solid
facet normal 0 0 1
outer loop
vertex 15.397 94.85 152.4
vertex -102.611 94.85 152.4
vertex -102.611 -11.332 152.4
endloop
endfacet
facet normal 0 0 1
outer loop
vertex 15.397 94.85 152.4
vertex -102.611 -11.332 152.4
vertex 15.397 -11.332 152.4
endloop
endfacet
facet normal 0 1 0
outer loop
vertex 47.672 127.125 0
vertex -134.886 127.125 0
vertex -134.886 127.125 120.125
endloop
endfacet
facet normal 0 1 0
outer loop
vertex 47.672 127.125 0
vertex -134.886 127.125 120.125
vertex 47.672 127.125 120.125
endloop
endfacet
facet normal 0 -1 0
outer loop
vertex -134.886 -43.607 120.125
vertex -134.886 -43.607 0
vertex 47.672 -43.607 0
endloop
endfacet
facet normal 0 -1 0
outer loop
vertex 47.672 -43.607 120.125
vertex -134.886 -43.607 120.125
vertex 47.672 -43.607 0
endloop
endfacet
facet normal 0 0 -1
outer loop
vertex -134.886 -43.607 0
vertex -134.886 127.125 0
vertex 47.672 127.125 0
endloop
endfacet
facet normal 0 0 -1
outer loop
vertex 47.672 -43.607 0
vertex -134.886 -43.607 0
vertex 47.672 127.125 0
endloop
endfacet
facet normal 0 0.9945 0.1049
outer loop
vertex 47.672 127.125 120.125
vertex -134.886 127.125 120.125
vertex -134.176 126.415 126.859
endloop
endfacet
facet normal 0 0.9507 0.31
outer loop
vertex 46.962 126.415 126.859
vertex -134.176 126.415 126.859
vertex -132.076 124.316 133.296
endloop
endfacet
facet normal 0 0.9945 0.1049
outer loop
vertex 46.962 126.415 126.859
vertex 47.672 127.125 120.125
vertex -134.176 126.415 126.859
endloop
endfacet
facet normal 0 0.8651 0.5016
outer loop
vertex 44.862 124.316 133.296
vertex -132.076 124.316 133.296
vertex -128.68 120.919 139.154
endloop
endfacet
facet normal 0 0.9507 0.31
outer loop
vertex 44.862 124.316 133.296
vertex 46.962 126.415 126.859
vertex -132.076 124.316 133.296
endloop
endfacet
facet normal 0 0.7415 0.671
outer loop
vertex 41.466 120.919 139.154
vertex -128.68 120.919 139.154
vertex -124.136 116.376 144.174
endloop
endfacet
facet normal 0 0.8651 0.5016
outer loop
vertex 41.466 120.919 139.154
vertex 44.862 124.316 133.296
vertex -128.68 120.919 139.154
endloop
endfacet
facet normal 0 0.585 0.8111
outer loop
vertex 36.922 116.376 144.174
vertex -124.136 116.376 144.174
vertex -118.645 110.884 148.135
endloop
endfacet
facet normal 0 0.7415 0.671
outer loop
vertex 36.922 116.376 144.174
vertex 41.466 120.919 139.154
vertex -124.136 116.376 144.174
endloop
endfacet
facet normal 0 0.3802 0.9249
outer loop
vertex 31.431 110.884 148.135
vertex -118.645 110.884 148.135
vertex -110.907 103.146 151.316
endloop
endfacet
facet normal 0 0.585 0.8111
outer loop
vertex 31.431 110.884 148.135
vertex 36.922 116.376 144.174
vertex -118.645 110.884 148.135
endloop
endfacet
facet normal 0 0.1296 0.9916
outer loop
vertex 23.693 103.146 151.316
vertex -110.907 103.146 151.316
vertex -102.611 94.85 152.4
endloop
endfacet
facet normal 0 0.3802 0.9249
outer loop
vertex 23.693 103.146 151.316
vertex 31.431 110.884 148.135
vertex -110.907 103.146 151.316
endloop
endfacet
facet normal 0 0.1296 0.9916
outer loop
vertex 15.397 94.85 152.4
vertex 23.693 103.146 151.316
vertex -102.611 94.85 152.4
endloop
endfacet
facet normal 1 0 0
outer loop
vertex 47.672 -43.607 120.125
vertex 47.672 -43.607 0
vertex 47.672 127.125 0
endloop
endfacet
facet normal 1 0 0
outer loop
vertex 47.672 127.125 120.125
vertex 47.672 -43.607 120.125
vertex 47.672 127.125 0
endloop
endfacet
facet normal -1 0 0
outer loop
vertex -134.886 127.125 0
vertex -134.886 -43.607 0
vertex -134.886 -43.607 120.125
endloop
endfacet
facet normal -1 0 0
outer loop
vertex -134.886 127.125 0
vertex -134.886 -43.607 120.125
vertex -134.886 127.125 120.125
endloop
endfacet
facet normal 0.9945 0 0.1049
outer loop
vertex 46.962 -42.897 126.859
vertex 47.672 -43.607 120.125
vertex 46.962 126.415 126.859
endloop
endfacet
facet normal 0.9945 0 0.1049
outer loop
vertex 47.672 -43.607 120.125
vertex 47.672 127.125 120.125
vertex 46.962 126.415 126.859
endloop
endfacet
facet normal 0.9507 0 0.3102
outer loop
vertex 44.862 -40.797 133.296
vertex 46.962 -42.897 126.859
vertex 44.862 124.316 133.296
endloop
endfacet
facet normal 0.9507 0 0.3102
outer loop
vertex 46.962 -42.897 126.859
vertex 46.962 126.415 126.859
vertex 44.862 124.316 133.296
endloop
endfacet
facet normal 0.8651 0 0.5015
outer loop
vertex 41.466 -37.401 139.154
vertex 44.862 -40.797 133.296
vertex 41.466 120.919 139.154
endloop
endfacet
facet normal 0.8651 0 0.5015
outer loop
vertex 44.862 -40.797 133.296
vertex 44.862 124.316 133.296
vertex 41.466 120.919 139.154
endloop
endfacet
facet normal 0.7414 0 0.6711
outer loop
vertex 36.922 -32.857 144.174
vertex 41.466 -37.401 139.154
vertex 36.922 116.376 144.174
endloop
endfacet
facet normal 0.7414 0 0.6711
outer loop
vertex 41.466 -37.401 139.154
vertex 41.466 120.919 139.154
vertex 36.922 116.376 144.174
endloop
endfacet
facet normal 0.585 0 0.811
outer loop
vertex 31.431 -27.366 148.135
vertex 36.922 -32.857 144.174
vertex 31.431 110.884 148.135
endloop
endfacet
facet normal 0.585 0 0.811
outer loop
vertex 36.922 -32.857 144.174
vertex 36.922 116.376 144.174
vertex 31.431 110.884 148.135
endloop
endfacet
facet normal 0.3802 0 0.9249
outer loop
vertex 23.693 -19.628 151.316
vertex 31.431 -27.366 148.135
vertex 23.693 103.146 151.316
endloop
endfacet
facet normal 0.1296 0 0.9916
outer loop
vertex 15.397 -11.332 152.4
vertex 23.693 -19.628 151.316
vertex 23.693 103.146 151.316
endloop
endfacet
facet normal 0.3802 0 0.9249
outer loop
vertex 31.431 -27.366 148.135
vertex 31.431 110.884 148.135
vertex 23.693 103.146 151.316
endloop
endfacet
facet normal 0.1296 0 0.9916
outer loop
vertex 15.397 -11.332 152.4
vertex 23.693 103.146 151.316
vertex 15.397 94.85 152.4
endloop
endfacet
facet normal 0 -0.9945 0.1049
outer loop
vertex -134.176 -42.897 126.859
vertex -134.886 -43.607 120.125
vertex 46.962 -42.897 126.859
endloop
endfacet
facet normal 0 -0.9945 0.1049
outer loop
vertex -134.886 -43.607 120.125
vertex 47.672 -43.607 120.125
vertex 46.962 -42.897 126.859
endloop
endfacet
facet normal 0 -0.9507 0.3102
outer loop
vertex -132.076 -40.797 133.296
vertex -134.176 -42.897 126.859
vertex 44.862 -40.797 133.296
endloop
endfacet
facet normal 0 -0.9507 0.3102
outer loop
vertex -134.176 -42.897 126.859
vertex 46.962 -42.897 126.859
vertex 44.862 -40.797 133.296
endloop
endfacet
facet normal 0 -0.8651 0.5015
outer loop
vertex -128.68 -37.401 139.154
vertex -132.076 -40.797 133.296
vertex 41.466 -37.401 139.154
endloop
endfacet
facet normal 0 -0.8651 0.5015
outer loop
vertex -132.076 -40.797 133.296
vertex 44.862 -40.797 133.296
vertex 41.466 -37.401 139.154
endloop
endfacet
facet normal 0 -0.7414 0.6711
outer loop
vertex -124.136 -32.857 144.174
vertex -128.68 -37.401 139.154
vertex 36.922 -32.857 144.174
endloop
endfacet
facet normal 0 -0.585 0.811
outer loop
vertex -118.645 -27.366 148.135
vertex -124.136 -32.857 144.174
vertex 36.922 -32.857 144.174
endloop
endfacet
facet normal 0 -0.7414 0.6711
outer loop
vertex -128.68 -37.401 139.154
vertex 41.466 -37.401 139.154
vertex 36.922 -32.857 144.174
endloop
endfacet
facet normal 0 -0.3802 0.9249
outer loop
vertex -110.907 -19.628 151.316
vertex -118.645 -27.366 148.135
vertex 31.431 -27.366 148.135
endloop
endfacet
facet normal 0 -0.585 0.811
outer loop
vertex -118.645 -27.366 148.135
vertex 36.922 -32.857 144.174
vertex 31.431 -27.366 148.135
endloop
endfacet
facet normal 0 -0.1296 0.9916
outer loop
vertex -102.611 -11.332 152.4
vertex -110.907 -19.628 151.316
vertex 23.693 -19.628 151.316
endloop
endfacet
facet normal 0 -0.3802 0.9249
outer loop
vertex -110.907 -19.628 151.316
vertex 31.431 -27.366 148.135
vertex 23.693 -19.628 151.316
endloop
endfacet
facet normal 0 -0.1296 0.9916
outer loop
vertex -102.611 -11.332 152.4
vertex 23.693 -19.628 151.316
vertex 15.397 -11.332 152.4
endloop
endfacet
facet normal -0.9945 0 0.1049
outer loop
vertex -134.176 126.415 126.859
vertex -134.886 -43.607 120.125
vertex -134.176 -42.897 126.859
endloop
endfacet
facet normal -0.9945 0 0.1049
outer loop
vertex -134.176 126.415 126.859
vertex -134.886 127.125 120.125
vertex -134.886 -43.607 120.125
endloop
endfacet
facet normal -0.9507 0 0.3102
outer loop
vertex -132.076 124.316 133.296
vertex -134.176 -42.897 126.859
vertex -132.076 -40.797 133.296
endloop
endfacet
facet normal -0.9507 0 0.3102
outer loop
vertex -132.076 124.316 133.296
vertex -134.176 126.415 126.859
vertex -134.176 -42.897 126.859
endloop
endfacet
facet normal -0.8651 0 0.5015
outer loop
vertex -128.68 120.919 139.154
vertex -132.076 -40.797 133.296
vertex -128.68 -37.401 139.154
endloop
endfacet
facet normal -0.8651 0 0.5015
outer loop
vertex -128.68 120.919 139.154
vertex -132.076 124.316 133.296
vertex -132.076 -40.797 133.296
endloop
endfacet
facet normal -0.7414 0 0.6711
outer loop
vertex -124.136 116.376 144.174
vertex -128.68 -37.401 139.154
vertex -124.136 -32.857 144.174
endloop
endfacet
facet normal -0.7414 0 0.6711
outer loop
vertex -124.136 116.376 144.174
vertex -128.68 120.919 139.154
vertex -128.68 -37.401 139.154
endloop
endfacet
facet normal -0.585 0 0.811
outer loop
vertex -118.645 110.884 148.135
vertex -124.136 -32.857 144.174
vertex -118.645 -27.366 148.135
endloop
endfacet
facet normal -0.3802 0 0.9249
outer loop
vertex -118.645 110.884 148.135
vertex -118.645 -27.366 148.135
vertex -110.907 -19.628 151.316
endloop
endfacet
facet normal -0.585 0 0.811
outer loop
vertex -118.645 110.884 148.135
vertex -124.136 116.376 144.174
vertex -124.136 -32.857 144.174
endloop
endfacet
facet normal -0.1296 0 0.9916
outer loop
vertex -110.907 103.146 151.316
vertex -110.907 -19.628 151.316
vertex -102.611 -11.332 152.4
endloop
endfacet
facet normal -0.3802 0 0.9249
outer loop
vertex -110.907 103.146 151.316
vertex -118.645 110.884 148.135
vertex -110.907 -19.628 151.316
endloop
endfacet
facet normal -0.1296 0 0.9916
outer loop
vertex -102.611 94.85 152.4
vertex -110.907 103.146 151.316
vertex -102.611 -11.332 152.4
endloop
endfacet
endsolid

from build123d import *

# Parameters (mm, degrees)
F0_W     = 182.557866
F0_H     = 170.73226
F2_DEPTH = 152.4
F3_R     = 32.274979
F4_DEPTH = 187.378392


with BuildPart() as f2:
    # F0 (on Top) → F2 (new body)
    with BuildSketch(Plane.XY):
        with Locations((-43.606944, 41.759193)):
            Rectangle(F0_W, F0_H)
    extrude(amount=F2_DEPTH)

    # F3
    f3_edges = [f2.edges().sort_by_distance(p)[0] for p in [
        (-43.606944, 127.125323, 152.4),
        (47.671989, 41.759193, 152.4),
        (-43.606944, -43.606937, 152.4),
        (-134.885877, 41.759193, 152.4),
    ]]
    fillet(f3_edges, radius=F3_R)

    # F1 (on face) → F4 (cut)
    with BuildSketch(Plane.XY):
        Polygon((-134.885877, -43.606937), (-134.885877, 80.69703), (-209.891543, 80.69703), (-209.891543, -80.69703), (0, -80.69703), (0, -43.606937), align=None)
    extrude(amount=F4_DEPTH, mode=Mode.SUBTRACT)


solid = f2.part
